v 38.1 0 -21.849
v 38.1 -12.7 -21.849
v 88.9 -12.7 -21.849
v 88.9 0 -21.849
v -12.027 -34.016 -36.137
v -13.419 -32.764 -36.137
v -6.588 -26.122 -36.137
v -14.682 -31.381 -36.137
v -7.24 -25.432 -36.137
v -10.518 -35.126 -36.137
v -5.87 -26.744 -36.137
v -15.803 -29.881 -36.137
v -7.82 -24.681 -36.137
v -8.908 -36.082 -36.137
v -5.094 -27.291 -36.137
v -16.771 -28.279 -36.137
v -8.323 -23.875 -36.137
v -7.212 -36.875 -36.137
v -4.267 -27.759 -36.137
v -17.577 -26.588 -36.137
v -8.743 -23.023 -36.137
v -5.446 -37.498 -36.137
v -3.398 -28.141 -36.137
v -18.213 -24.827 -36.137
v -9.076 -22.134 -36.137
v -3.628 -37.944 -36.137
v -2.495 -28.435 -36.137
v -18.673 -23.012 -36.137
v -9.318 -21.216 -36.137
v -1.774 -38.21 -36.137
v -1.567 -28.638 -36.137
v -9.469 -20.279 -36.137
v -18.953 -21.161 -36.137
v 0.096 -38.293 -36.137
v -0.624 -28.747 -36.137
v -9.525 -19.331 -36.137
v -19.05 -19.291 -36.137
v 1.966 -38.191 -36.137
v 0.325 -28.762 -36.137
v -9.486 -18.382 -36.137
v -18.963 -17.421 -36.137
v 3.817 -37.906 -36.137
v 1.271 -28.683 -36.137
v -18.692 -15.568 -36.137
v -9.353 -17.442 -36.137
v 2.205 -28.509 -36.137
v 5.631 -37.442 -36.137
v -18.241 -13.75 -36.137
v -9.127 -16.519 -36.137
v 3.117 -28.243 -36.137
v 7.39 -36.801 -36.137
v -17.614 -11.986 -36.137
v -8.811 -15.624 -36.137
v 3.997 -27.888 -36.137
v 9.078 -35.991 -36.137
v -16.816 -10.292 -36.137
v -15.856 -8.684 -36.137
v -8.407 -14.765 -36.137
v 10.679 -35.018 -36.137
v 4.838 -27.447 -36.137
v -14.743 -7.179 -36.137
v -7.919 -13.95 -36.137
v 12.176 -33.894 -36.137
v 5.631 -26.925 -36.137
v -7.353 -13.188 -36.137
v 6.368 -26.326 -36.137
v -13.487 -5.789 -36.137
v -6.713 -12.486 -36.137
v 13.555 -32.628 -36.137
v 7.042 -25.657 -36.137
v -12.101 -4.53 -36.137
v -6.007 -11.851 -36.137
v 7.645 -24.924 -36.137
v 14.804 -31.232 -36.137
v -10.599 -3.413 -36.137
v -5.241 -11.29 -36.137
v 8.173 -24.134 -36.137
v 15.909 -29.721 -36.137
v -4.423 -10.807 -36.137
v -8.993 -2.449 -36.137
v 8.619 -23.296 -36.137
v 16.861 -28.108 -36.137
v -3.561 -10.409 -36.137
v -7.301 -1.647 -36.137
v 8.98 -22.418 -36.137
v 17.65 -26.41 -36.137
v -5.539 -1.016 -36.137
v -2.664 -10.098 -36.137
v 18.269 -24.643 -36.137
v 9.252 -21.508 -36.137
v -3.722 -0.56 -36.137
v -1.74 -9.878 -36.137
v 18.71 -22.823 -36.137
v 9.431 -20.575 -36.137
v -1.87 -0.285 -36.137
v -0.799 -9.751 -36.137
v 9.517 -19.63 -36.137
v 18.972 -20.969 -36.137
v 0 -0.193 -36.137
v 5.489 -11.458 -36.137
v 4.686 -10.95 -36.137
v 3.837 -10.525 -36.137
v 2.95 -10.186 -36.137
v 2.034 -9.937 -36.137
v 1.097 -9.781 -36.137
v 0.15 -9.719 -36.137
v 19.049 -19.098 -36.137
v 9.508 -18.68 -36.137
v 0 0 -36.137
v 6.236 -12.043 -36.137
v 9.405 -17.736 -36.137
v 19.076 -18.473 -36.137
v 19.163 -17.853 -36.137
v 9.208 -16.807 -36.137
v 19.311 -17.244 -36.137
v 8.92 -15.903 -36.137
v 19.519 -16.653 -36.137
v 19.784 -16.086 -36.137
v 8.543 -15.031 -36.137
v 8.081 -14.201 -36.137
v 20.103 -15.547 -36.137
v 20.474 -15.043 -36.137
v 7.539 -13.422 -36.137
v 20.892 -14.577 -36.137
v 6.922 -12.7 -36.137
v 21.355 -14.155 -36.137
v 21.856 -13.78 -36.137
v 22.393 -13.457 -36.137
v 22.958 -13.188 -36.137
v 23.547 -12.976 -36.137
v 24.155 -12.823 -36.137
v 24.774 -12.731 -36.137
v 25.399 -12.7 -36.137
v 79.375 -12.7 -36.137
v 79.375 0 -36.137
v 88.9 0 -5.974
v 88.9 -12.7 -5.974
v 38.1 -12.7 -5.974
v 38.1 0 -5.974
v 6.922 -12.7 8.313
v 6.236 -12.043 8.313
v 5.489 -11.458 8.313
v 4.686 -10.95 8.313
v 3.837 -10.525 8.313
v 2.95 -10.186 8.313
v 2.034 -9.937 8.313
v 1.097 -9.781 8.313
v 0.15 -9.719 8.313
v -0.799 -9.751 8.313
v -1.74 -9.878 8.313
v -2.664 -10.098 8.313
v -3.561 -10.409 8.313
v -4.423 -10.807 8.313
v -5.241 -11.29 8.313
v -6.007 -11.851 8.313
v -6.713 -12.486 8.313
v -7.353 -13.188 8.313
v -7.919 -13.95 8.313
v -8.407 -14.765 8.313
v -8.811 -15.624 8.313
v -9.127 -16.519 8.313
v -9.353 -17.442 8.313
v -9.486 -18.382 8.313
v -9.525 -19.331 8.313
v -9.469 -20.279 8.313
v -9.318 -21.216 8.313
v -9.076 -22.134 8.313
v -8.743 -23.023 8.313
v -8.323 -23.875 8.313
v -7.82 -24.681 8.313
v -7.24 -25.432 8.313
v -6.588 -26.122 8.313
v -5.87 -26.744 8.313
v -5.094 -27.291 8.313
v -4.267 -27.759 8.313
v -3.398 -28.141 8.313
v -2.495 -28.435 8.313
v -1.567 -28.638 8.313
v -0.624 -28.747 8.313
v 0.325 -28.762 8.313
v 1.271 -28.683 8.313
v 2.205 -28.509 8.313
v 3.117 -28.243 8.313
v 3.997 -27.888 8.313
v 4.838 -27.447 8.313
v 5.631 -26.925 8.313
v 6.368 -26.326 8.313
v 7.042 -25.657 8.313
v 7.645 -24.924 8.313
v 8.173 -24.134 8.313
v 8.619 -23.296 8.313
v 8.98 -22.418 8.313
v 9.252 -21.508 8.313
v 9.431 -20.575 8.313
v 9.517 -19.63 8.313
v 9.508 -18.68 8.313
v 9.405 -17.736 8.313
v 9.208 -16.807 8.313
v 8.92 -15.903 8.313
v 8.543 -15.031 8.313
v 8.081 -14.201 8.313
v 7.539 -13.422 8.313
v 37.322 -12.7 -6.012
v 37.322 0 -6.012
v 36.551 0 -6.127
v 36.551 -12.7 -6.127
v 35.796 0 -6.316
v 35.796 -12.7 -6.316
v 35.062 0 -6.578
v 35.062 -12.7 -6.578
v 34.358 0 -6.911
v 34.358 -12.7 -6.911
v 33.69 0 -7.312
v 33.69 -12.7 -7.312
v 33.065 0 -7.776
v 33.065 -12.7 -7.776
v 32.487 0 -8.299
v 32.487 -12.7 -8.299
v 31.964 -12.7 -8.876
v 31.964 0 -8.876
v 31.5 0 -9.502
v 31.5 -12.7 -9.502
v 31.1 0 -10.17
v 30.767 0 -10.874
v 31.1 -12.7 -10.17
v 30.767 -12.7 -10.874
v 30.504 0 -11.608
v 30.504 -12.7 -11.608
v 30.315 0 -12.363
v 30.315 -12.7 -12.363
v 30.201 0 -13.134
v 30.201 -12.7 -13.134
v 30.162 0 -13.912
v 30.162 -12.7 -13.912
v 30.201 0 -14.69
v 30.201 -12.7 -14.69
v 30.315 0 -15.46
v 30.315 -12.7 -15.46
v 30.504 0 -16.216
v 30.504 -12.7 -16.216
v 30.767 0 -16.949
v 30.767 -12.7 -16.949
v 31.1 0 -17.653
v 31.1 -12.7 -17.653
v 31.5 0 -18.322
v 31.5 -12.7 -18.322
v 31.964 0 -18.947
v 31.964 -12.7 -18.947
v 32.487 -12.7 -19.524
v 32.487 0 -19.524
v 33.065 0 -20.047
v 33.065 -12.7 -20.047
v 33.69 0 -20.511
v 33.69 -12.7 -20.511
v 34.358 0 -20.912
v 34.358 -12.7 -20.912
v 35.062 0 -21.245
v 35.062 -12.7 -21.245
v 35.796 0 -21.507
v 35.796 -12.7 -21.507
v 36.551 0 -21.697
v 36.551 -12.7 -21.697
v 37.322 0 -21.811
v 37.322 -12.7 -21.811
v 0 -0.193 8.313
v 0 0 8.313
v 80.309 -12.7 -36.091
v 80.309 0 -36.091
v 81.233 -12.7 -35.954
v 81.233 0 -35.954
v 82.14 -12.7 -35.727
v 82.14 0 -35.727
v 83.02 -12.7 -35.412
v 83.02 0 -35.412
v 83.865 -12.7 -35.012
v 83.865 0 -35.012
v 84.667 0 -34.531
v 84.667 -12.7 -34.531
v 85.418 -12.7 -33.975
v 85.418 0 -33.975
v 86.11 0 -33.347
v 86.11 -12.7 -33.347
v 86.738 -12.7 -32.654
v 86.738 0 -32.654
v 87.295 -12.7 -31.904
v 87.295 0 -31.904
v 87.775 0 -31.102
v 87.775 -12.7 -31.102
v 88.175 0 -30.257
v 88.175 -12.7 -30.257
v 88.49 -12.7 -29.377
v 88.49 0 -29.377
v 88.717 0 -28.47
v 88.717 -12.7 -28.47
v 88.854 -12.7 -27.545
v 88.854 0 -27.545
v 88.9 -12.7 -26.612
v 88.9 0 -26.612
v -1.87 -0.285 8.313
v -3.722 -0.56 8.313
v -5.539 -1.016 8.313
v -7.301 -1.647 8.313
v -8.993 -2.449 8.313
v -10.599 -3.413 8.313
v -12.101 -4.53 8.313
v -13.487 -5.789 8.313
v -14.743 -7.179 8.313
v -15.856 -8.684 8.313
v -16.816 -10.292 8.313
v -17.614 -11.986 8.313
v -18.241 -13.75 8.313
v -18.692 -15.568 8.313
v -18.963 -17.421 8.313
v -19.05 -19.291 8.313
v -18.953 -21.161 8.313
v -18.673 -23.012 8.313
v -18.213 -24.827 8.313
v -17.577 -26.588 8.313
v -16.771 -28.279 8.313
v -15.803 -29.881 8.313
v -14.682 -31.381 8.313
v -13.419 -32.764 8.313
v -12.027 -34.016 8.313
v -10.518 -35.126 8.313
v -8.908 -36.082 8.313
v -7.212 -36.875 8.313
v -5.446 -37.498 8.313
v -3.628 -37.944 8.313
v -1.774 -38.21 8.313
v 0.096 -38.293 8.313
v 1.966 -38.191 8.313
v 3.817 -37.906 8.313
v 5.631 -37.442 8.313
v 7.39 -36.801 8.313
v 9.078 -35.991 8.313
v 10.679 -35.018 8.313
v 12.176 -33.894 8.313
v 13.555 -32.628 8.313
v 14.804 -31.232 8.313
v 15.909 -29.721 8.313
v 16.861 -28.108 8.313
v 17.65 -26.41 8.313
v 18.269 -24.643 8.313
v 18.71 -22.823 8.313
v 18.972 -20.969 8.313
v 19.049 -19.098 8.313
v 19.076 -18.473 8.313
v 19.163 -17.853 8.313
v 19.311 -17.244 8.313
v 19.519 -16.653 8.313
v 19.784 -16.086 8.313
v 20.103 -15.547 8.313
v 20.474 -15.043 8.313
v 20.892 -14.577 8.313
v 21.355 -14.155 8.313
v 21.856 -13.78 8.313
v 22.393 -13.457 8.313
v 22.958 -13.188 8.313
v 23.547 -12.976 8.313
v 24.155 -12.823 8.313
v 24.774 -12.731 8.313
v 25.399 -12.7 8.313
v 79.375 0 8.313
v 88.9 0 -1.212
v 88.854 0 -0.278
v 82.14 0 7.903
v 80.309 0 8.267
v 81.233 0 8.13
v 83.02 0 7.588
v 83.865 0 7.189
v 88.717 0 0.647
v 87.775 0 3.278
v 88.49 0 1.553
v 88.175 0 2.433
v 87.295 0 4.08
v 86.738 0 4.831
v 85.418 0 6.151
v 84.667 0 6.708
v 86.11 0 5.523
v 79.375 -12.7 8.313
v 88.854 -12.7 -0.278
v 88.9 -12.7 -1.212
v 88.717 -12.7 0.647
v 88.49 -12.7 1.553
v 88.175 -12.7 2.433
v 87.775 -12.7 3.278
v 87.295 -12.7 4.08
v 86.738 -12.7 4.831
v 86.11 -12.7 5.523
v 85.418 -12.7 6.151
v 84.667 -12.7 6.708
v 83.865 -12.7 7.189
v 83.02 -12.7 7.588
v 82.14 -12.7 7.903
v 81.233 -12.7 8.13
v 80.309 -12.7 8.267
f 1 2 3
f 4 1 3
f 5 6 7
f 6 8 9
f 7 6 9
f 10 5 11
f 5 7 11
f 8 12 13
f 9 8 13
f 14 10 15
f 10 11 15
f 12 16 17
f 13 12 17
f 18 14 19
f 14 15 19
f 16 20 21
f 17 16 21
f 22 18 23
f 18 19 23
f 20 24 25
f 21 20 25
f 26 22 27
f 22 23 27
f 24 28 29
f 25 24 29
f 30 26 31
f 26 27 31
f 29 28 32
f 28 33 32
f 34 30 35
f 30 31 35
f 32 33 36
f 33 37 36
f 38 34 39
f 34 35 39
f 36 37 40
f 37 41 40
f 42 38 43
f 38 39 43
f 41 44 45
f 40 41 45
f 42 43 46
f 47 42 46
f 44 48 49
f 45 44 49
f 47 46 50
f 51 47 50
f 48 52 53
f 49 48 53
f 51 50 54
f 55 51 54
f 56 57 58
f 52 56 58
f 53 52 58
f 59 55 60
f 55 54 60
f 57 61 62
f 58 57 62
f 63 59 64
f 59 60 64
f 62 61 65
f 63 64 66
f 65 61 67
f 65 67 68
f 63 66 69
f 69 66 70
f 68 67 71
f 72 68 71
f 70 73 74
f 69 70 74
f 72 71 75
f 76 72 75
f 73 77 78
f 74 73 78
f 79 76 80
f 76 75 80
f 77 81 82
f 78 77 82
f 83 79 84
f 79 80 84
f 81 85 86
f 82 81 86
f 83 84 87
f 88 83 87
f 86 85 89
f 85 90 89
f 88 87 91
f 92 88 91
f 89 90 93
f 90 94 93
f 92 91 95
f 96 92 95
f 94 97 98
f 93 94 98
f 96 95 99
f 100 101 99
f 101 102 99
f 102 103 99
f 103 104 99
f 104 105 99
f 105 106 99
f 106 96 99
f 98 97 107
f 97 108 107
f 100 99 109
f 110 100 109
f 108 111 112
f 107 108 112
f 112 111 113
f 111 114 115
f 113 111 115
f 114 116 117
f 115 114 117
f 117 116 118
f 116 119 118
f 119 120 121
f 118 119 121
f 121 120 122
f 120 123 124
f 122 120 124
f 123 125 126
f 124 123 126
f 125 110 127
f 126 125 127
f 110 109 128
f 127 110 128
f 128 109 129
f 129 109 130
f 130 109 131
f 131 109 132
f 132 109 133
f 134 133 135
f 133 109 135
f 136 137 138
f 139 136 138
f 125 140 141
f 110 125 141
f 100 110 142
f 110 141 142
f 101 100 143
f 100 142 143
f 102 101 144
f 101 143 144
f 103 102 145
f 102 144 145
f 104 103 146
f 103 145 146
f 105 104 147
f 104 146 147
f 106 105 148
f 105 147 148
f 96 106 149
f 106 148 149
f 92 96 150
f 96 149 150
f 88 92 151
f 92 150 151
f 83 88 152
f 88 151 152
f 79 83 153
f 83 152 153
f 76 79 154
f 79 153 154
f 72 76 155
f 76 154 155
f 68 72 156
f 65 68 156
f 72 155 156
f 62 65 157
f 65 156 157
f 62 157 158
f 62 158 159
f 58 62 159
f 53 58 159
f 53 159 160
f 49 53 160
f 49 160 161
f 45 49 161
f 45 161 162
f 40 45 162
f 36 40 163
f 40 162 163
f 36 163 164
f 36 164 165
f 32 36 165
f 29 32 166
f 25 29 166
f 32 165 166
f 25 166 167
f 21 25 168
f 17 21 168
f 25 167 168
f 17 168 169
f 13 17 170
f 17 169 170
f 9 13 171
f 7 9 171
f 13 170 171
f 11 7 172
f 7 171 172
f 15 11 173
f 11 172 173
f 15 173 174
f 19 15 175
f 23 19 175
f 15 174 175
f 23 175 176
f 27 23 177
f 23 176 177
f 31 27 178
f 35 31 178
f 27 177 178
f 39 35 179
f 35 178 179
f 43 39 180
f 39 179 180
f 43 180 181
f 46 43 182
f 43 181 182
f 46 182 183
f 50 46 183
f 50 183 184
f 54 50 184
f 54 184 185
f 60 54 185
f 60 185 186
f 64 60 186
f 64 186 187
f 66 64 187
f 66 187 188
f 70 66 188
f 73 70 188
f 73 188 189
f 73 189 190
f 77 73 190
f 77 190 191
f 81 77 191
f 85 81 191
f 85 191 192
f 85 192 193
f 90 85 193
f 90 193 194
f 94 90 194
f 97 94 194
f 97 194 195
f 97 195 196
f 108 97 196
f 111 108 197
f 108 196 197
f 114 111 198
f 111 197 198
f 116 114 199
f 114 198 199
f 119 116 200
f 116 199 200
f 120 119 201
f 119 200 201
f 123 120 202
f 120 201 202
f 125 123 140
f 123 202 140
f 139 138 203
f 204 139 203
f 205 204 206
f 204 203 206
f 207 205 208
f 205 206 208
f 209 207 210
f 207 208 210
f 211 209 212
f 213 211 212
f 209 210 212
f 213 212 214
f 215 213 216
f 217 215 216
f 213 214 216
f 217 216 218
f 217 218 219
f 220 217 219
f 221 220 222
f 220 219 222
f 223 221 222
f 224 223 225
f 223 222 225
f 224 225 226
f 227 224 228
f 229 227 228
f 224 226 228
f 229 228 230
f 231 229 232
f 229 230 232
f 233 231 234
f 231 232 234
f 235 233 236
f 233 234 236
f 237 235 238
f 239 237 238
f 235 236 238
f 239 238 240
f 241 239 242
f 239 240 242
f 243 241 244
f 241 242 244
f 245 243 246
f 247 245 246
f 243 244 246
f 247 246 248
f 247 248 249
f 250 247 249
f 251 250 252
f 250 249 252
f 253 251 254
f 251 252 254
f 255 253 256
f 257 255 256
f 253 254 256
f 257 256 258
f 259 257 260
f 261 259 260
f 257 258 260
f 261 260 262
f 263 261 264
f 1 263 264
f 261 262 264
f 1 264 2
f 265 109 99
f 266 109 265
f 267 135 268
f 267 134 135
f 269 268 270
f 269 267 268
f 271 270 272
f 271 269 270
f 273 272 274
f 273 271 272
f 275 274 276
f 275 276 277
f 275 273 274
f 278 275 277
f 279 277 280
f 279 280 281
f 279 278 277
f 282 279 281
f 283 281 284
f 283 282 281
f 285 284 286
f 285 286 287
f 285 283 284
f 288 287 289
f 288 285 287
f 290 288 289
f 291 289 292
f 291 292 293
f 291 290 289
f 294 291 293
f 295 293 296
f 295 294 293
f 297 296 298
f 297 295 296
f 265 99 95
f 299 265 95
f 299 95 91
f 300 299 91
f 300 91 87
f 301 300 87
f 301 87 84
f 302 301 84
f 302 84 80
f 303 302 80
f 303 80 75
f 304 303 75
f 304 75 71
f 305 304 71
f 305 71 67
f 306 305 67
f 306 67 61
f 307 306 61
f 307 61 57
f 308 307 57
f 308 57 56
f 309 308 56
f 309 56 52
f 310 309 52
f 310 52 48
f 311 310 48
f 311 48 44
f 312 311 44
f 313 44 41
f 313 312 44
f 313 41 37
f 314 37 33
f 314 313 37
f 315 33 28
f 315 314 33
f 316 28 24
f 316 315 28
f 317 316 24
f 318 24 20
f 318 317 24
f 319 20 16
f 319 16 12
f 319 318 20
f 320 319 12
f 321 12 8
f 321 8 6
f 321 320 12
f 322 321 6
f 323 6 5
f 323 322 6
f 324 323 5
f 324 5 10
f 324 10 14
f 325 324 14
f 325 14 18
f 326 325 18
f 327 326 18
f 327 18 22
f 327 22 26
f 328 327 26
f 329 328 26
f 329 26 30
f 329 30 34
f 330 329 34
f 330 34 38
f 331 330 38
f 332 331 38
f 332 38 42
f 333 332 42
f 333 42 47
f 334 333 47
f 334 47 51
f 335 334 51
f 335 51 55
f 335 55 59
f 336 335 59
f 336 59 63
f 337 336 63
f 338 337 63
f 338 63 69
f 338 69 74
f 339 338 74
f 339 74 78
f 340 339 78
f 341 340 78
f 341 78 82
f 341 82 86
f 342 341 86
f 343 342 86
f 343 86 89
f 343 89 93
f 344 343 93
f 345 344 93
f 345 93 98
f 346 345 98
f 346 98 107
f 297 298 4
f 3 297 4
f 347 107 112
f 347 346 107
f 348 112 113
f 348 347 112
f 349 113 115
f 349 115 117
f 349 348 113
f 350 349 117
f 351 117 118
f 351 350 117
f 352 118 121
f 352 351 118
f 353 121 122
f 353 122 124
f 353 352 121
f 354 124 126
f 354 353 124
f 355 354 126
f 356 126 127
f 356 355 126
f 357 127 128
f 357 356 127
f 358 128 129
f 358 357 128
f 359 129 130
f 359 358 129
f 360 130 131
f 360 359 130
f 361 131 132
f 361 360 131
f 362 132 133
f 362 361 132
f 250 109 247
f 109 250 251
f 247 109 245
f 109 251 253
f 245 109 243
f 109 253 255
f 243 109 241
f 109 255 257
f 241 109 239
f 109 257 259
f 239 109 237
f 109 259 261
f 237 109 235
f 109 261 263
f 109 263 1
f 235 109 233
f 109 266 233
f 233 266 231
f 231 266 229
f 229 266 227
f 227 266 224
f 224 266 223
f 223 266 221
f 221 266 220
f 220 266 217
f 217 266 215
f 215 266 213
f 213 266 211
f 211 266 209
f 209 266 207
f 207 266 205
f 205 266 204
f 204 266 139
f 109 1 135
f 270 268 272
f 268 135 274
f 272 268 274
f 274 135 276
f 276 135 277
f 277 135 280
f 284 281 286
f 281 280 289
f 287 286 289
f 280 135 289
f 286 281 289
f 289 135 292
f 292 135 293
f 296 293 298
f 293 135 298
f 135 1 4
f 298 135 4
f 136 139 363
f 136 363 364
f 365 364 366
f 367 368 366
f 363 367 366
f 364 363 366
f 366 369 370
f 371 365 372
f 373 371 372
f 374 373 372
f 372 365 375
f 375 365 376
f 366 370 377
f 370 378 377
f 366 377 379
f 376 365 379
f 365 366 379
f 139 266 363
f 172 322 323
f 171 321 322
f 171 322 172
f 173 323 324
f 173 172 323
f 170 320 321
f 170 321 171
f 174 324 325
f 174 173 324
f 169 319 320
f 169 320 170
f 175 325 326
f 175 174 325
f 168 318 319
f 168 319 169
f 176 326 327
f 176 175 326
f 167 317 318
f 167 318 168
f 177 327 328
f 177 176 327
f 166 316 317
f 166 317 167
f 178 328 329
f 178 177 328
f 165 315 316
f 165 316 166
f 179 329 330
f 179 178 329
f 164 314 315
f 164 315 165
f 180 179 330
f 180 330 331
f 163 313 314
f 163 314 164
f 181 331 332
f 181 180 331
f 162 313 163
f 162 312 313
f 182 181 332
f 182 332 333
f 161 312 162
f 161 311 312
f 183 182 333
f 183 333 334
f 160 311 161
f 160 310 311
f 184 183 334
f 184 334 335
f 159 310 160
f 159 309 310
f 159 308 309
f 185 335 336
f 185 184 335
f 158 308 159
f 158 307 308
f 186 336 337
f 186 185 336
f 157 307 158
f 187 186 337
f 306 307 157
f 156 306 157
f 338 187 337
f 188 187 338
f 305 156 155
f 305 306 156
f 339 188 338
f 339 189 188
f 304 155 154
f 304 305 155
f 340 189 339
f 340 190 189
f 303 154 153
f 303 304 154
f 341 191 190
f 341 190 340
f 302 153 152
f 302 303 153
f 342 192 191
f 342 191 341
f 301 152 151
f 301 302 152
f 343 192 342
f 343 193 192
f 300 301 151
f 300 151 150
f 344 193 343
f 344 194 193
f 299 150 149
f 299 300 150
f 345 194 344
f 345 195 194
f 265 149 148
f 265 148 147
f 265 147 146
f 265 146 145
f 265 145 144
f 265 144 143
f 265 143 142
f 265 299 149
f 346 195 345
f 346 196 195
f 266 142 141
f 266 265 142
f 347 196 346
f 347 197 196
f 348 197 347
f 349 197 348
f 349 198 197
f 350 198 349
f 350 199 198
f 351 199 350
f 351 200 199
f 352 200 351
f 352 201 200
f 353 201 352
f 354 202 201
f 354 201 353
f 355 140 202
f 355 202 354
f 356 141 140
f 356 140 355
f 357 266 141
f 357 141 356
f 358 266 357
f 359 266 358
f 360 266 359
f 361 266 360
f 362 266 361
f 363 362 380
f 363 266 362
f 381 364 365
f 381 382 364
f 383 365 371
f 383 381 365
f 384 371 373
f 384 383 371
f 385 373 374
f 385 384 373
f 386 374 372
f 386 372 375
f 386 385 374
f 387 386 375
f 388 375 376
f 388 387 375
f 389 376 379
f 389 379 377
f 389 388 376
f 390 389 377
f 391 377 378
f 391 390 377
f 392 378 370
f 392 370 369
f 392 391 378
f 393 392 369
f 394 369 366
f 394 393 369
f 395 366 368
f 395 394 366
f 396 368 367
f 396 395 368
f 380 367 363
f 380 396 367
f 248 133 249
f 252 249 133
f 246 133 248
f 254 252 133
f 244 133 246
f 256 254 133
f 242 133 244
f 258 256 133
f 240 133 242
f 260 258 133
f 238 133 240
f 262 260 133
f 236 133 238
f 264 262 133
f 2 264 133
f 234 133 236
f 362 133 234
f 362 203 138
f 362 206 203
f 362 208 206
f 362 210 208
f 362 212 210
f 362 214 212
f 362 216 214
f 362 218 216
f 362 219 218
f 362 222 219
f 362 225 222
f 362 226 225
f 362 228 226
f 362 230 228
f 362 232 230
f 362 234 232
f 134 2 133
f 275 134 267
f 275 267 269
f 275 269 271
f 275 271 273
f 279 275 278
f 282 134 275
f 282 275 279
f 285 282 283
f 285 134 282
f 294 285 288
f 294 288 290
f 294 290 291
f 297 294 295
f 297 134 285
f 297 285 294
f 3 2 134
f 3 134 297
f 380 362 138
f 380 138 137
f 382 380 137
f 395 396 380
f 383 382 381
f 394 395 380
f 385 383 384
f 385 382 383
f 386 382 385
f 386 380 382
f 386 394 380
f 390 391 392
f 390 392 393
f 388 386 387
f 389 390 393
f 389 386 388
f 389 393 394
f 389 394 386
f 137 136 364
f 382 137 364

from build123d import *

# Parameters (mm, degrees)
F0_W     = 88.9
F0_H     = 44.45
F1_DEPTH = 12.7
F2_R     = 9.525
F4_DEPTH = 12.7
F5_R     = 19.05
F5_R_2   = 9.525
F6_DEPTH = 44.45
F7_R     = 9.525
F8_DEPTH = 44.45
F9_R     = 6.35


with BuildPart() as f1:
    # F0 (on Front) → F1 (new body)
    with BuildSketch(Plane.XZ):
        with Locations((44.45, -13.911705)):
            Rectangle(F0_W, F0_H)
    extrude(amount=F1_DEPTH)

    # F2
    f2_edges = [f1.edges().sort_by_distance(p)[0] for p in [
        (88.9, -6.35, 8.313295),
        (88.9, -6.35, -36.136705),
    ]]
    fillet(f2_edges, radius=F2_R)

    # F3 (on face) → F4 (cut)
    with BuildSketch(Plane.XZ.offset(12.7)):
        with BuildLine():
            ThreePointArc((38.1, -21.849205), (43.71266, -19.524366), (46.0375, -13.911705))
            ThreePointArc((46.0375, -13.911705), (43.71266, -8.299045), (38.1, -5.974205))
            ThreePointArc((38.1, -5.974205), (30.1625, -13.911705), (38.1, -21.849205))
        make_face()
        with BuildLine():
            ThreePointArc((38.1, -5.974205), (43.71266, -8.299045), (46.0375, -13.911705))
            ThreePointArc((46.0375, -13.911705), (43.71266, -19.524366), (38.1, -21.849205))
            Line((38.1, -21.849205), (88.9, -21.849205))
            Line((88.9, -21.849205), (88.9, -5.974205))
            Line((88.9, -5.974205), (38.1, -5.974205))
        make_face()
    extrude(amount=-F4_DEPTH, mode=Mode.SUBTRACT)

    # F5 (on face) → F6 (join)
    with BuildSketch(Plane.XY.offset(8.313295)):
        with Locations((0, -19.242762)):
            Circle(F5_R)
        with Locations((0, -19.242762)):
            Circle(F5_R_2, mode=Mode.SUBTRACT)
    extrude(amount=-F6_DEPTH)

    # F7 (on face) → F8 (cut)
    with BuildSketch(Plane.XY.offset(8.313295)):
        with Locations((0, -19.242762)):
            Circle(F7_R)
    extrude(amount=-F8_DEPTH, mode=Mode.SUBTRACT)

    # F9
    f9_edges = [f1.edges().sort_by_distance(p)[0] for p in [
        (17.891192, -12.7, -13.911705),
    ]]
    fillet(f9_edges, radius=F9_R)


solid = f1.part
